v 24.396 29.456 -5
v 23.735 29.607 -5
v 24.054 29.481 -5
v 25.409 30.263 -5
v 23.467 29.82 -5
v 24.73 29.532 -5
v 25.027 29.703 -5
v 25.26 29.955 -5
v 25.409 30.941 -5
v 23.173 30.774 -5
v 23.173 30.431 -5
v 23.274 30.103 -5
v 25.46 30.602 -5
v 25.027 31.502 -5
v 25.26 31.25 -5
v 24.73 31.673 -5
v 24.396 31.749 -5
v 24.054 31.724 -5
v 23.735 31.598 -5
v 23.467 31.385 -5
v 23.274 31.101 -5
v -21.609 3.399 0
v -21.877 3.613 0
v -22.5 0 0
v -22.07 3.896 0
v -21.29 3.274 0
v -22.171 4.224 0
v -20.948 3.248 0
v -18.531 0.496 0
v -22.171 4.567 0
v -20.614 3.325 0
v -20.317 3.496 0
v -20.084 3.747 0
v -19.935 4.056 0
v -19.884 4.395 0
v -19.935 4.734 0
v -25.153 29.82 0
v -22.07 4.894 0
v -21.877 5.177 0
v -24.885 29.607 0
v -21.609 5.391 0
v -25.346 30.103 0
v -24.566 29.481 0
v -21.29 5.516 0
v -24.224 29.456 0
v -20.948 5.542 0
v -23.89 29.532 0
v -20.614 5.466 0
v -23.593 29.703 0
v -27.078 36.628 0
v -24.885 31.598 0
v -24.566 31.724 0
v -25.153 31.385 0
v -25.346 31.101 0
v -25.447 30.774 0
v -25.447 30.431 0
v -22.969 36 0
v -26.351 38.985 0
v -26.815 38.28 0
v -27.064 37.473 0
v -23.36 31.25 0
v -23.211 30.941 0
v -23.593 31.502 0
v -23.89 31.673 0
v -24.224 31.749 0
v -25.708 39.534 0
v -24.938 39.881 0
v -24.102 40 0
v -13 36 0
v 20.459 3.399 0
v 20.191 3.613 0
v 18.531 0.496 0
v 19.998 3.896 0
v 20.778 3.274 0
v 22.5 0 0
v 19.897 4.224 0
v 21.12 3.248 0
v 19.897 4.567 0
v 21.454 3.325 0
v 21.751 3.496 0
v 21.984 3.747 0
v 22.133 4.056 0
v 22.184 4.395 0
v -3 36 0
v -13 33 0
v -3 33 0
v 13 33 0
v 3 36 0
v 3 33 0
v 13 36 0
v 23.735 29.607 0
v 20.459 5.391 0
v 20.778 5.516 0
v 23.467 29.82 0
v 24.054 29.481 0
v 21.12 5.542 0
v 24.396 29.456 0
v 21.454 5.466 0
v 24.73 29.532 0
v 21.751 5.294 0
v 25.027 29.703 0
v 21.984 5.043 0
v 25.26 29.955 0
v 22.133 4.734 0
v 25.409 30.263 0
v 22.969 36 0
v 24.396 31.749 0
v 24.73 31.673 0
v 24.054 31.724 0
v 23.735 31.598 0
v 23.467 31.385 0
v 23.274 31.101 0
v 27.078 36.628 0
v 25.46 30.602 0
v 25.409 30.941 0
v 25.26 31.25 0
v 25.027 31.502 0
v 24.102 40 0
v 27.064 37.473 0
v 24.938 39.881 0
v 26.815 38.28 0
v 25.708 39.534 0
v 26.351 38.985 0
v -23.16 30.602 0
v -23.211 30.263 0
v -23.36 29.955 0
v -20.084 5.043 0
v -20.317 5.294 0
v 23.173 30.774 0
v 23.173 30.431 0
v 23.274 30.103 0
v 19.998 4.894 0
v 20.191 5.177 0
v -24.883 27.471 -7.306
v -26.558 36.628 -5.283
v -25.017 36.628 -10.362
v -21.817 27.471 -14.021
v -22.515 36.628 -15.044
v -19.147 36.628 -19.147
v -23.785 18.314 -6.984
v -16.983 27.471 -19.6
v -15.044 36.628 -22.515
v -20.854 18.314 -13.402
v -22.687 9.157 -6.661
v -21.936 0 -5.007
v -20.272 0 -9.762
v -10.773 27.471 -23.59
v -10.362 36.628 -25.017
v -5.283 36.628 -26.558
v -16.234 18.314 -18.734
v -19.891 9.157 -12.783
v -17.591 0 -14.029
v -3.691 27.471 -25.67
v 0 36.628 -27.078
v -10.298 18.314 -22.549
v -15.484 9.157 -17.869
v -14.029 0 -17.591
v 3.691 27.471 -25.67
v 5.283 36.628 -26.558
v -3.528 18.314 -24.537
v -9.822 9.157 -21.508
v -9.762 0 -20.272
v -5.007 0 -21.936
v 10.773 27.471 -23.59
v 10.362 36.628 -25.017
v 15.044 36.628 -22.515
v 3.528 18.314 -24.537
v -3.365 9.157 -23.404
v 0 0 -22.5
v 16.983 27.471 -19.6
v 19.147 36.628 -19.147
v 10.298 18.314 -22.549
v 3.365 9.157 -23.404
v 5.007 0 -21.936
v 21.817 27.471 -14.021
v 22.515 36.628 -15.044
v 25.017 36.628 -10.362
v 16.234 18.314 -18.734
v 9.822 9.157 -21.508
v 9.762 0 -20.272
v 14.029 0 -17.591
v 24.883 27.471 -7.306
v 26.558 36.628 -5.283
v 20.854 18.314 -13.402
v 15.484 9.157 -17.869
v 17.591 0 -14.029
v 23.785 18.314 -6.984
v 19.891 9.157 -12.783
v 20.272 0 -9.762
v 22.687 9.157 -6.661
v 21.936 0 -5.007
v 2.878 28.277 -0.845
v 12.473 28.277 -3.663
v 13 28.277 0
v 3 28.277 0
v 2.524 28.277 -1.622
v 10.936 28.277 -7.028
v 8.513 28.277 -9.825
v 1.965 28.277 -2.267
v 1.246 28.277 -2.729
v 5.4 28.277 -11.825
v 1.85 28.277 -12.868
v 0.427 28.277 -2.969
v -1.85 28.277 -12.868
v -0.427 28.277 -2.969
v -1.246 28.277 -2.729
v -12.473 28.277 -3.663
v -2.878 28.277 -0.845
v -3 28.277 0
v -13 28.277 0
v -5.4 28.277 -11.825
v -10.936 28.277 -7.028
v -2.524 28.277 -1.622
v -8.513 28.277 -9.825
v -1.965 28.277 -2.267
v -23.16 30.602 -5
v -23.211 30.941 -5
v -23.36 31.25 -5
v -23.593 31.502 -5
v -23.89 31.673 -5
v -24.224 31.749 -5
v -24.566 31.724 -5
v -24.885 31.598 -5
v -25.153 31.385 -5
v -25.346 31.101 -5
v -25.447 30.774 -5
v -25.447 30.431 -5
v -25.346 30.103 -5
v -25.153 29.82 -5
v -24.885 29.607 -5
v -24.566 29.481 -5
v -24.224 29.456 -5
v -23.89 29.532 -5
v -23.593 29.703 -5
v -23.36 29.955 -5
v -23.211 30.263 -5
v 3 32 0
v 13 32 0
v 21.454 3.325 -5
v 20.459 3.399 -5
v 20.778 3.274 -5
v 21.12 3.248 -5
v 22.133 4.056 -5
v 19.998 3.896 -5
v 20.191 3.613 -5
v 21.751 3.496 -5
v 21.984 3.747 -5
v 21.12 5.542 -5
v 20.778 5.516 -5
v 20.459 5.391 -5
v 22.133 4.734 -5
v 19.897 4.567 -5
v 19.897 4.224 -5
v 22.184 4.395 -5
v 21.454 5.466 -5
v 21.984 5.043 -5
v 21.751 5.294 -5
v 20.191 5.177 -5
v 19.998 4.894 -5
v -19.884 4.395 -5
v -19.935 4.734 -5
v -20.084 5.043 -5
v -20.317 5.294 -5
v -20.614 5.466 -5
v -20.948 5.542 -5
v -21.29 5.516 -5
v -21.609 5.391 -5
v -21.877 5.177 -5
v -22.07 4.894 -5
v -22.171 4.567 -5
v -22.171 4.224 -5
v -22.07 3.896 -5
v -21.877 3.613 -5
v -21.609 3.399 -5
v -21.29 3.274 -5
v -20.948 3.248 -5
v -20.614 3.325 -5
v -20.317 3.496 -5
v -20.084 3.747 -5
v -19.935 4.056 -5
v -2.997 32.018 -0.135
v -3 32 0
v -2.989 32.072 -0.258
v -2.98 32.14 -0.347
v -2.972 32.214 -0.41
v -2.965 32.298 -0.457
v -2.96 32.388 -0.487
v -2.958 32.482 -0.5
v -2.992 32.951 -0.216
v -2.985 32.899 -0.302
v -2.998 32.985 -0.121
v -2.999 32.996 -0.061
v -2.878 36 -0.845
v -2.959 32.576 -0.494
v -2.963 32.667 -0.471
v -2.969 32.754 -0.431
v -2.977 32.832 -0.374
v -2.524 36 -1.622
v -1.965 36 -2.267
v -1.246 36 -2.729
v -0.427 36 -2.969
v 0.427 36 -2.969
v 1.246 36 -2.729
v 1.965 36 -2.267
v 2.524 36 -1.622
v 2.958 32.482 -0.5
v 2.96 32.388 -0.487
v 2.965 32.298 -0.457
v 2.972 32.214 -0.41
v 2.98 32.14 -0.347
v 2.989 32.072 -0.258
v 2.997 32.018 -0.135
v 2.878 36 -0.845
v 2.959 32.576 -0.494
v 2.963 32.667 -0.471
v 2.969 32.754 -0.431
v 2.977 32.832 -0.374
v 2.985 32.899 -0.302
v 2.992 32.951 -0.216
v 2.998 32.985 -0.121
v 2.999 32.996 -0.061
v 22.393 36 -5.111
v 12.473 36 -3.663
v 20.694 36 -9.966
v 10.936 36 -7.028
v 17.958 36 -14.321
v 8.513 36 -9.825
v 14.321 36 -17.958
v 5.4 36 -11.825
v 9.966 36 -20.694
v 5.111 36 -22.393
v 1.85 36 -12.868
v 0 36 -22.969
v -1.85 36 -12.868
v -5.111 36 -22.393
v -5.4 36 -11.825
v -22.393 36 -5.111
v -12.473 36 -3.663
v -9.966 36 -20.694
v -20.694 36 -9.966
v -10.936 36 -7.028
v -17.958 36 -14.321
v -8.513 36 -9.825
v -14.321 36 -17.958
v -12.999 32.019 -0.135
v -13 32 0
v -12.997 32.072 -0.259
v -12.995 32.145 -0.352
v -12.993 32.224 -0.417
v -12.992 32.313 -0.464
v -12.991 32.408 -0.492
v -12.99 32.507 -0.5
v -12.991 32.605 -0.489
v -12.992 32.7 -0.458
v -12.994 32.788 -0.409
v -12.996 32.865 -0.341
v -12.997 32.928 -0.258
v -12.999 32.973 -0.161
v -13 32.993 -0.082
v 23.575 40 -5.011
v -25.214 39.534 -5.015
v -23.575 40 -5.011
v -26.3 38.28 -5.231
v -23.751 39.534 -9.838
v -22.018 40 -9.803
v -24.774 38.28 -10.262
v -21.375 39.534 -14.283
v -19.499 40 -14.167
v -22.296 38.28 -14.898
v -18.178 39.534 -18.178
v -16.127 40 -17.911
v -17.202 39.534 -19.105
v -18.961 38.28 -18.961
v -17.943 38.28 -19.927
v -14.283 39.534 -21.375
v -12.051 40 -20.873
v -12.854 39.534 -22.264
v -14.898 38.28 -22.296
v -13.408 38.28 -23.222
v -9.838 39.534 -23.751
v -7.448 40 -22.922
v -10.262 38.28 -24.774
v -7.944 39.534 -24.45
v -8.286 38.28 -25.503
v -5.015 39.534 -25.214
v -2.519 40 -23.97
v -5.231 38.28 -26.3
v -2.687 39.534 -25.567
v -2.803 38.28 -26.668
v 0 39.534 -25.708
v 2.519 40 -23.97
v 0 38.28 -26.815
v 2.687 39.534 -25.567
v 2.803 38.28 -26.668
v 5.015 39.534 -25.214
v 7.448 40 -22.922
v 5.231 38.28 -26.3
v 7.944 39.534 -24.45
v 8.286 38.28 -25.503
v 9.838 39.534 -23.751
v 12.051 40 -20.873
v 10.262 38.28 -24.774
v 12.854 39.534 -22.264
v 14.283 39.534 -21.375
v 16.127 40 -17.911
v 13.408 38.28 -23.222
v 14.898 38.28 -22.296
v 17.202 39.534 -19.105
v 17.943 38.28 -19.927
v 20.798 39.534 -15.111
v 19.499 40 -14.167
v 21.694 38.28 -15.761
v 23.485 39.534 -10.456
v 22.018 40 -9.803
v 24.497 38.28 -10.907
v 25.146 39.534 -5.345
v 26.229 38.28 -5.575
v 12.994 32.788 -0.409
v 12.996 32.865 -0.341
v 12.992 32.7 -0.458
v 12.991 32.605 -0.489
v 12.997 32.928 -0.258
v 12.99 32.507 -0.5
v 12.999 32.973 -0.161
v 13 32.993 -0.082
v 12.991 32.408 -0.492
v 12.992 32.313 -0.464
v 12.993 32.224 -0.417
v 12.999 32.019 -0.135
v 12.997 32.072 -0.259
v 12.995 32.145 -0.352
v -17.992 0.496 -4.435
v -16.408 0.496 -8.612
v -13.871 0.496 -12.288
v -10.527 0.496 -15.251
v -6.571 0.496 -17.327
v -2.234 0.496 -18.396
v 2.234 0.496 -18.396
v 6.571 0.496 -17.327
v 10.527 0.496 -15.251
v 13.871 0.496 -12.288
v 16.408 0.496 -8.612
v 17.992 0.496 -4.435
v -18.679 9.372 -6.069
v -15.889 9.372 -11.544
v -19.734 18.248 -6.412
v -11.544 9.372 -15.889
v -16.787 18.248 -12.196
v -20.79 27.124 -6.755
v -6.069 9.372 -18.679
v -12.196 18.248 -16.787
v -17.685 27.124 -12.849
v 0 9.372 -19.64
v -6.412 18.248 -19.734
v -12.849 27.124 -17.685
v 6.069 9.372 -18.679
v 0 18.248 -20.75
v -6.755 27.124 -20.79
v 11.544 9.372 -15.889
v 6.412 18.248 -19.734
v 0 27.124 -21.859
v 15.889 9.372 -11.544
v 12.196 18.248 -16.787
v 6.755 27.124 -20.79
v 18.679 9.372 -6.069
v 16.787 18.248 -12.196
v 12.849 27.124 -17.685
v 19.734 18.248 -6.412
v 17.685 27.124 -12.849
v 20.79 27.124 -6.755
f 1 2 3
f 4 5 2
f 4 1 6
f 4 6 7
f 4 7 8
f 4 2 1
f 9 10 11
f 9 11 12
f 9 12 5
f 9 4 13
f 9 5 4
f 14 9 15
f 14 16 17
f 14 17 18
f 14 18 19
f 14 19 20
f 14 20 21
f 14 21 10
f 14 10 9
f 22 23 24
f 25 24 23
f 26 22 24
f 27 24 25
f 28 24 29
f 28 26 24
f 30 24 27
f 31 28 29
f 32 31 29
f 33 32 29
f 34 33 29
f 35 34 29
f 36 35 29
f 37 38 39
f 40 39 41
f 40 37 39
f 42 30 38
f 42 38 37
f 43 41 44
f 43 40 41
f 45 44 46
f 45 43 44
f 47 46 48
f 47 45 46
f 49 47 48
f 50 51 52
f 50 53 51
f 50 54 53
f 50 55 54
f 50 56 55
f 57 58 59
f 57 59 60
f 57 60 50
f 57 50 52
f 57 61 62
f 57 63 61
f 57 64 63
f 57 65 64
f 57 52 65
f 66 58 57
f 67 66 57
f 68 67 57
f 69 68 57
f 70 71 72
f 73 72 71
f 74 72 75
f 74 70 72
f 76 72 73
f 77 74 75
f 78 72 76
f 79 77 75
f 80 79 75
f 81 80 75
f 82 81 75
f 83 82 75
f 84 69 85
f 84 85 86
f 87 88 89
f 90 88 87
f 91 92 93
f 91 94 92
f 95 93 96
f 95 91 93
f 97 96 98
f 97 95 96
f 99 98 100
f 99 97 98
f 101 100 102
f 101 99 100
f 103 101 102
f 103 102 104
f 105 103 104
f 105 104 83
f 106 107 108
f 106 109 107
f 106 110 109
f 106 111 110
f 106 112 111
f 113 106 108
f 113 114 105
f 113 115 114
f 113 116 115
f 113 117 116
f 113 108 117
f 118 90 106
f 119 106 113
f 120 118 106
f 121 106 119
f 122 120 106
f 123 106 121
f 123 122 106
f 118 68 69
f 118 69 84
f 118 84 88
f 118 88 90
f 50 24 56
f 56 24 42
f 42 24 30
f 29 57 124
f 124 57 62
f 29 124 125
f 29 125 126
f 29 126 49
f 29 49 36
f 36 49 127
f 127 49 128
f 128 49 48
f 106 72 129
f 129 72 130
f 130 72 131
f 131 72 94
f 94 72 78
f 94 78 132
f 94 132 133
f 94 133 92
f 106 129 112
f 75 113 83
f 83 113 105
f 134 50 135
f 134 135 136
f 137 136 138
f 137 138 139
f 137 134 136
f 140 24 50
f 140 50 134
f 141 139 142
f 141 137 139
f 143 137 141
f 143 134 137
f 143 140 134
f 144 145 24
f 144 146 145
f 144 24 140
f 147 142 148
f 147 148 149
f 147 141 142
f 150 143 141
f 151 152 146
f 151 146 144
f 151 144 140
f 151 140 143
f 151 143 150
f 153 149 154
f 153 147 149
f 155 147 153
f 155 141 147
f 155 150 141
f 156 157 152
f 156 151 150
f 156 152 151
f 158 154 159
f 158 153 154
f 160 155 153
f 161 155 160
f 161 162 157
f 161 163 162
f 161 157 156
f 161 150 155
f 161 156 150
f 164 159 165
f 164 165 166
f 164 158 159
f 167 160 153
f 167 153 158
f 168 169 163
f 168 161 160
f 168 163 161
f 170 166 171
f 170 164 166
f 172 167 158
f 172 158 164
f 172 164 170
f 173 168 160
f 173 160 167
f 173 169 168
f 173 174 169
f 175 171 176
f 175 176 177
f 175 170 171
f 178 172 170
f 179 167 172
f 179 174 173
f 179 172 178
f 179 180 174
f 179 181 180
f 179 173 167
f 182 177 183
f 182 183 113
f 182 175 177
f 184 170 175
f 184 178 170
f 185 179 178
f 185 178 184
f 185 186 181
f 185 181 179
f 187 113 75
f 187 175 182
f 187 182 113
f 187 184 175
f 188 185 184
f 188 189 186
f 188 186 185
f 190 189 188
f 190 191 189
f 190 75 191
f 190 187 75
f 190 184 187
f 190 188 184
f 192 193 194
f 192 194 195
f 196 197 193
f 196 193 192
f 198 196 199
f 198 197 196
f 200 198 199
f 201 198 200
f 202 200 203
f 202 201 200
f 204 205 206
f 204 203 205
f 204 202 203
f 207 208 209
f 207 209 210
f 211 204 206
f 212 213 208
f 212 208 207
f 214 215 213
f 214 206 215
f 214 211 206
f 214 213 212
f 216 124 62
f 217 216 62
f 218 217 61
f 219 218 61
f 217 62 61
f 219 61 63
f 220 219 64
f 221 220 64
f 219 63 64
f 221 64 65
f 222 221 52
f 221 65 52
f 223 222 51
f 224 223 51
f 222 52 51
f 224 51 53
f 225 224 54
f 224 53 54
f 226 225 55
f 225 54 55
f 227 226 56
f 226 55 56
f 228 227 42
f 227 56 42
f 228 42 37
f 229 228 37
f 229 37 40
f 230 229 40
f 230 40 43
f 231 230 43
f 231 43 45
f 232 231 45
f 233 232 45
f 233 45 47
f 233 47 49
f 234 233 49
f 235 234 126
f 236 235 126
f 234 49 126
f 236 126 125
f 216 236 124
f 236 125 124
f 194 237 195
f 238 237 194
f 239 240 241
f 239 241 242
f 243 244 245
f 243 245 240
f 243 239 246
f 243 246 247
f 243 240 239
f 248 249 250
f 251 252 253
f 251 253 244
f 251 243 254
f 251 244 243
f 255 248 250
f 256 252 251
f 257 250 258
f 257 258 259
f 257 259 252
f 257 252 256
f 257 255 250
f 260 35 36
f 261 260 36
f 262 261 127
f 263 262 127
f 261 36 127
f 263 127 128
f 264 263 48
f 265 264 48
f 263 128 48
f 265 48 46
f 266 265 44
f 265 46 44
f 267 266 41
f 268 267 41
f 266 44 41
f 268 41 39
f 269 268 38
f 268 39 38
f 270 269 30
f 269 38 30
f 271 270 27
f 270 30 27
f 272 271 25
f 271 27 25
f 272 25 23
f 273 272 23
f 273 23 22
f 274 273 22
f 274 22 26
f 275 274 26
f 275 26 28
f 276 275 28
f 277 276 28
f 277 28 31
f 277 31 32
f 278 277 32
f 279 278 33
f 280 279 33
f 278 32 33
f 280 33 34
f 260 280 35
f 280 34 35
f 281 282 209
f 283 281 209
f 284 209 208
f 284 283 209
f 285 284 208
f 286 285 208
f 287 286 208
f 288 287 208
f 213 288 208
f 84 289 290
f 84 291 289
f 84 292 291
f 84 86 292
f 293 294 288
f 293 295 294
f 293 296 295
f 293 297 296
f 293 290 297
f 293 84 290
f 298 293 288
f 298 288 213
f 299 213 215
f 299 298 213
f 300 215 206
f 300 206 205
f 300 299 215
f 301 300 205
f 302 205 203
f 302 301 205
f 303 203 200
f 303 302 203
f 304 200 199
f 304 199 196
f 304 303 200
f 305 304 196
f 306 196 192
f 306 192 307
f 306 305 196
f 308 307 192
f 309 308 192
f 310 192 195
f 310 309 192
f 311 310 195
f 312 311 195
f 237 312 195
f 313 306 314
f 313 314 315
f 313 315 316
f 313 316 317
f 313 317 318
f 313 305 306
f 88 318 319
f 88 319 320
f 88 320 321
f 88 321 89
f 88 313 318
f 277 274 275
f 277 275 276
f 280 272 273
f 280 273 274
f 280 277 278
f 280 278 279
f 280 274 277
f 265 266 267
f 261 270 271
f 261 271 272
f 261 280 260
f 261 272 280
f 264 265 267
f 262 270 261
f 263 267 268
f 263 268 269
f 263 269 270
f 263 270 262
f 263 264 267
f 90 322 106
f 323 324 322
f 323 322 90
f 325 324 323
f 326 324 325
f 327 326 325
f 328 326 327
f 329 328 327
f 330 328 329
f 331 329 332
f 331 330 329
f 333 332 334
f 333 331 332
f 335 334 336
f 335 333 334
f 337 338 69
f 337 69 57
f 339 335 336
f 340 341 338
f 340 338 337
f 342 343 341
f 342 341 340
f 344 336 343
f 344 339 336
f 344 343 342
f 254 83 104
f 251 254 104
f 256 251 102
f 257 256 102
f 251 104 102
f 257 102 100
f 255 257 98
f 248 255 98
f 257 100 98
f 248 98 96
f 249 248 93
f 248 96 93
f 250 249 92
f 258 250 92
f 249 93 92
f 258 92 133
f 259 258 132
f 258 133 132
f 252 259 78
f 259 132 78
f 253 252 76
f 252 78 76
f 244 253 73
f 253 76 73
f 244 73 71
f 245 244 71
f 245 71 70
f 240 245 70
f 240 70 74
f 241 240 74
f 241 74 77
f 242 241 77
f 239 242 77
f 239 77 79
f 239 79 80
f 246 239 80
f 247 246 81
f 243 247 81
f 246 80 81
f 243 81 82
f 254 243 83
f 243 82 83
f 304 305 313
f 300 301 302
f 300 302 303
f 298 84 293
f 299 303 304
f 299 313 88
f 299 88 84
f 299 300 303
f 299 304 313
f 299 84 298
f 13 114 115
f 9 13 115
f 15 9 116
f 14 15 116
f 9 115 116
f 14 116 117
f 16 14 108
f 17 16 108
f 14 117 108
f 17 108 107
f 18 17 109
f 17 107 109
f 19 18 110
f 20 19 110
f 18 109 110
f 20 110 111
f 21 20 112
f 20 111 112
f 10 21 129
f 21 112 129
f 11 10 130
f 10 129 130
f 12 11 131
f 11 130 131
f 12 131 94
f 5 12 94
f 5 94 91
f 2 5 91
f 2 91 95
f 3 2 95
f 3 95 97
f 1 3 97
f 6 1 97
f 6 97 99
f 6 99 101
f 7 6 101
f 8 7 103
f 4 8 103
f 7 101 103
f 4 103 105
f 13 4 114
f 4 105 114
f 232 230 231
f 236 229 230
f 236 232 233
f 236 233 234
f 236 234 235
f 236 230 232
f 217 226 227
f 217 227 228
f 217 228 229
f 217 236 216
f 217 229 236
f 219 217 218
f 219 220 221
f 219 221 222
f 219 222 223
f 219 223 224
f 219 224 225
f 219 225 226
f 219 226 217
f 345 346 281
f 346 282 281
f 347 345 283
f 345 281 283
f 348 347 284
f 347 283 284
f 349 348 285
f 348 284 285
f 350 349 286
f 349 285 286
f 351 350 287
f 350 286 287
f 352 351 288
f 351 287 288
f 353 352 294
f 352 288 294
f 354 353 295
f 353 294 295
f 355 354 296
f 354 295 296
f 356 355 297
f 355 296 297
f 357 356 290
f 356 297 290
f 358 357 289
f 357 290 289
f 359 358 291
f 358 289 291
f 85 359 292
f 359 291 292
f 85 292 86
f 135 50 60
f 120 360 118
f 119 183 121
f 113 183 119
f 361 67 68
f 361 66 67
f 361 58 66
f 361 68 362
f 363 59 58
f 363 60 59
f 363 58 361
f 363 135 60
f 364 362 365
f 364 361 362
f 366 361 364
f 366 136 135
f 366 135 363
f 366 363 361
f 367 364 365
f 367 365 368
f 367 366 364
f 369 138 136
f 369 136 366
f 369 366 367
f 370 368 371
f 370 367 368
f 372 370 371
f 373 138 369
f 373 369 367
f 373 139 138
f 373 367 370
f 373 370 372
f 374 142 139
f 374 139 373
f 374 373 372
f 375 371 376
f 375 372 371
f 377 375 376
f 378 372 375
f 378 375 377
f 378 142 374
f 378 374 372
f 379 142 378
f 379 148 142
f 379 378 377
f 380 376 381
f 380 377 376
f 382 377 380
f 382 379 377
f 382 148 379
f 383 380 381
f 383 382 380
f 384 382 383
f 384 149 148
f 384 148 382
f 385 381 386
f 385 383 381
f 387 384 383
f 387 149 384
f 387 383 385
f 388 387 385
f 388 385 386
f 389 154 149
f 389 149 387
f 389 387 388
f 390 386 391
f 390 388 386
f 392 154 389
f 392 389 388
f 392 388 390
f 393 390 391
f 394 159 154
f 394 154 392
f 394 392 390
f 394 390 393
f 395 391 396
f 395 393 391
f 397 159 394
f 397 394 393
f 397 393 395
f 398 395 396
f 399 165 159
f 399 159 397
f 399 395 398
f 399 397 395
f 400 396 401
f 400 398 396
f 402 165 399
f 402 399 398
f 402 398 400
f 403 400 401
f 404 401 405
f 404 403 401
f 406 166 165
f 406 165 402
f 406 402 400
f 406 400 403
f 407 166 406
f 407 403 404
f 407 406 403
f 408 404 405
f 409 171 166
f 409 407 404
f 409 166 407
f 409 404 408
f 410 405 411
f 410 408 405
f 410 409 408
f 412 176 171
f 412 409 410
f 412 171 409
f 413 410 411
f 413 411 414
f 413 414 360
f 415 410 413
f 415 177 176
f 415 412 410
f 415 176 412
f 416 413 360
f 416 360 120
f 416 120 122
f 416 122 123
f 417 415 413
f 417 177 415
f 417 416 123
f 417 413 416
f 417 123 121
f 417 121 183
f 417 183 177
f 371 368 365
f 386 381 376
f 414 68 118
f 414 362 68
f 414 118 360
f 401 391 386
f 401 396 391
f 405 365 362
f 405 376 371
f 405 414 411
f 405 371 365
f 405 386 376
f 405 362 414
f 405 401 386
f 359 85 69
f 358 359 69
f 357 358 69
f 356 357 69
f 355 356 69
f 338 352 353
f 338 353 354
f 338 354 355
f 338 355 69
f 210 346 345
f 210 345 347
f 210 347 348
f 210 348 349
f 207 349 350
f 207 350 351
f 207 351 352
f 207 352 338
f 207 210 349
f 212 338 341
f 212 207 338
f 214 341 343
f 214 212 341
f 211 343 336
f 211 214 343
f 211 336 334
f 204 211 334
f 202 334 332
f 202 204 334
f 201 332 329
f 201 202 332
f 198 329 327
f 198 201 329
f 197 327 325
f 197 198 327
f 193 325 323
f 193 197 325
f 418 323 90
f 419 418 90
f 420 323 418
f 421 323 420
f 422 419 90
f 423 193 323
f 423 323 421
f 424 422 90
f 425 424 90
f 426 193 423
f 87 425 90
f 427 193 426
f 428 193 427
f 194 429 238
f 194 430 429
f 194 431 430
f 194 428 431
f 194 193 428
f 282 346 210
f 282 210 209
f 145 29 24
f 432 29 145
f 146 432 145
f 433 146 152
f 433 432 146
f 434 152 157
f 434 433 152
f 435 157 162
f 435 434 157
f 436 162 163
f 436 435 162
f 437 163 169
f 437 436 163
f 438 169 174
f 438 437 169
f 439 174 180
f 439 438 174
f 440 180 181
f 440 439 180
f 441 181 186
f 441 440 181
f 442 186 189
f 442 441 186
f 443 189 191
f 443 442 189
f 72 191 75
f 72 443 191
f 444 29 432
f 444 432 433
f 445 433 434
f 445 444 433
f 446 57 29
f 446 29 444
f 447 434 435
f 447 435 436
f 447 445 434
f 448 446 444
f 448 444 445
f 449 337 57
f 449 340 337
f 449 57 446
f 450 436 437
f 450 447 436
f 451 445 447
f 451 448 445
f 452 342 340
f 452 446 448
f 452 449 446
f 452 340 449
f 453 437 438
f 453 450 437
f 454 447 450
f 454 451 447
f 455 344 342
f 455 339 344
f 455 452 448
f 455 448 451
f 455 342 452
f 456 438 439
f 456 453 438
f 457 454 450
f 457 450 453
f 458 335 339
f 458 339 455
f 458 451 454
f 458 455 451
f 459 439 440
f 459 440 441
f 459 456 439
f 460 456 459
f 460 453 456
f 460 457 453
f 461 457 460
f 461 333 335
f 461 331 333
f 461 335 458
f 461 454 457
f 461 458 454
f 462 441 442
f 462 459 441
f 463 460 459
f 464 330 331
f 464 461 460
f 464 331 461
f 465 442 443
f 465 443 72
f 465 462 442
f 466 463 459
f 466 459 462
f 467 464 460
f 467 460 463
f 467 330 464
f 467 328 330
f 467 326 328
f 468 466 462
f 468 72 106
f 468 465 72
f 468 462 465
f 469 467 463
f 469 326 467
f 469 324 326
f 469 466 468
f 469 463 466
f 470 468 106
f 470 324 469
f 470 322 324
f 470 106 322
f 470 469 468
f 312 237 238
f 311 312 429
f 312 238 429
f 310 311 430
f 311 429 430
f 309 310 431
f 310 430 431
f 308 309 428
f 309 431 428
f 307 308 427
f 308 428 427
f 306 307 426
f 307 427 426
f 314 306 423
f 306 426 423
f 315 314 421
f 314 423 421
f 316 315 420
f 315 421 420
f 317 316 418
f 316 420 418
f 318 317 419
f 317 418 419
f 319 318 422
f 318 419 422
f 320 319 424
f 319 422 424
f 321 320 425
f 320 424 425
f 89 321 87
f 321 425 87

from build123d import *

# Parameters (mm, degrees)
REVOLVE1_ANGLE     = 180
FILLET1_R          = 3
SKETCH2_W          = 30
SKETCH2_H          = 0.5
SKETCH3_R          = 1.15
CUT_EXTRUDE1_DEPTH = 5


with BuildPart() as part:
    # Sketch1 → Revolve1 (revolve)
    with BuildSketch(Plane.XY):
        Polygon((0, 40), (-27.5, 40), (-22.5, 0), (-18.530888493, 0.496138938), (-22.968871126, 36), (-13, 36), (-13, 28.277027027), (-3, 28.277027027), (-3, 36), (0, 36), align=None)
    revolve(axis=Axis((0, 40, 0), (0, -1, 0)), revolution_arc=REVOLVE1_ANGLE)

    # Fillet1
    fillet1_edges = [part.edges().sort_by_distance(p)[0] for p in [
        (0, 40, -27.5),
    ]]
    fillet(fillet1_edges, radius=FILLET1_R)

    # Sketch2 → Cut-Revolve1 (revolve, cut)
    with BuildSketch(Plane.XY):
        with Locations((1, 32.75)):
            Rectangle(SKETCH2_W, SKETCH2_H)
    revolve(axis=Axis((-14, 32.5, 0), (1, 0, 0)), mode=Mode.SUBTRACT)

    # Sketch3 → Cut-Extrude1 (cut)
    with BuildSketch(Plane.XY):
        with Locations((-24.309743639, 30.602464611)):
            Circle(SKETCH3_R)
        with Locations((-21.033834323, 4.395190082)):
            Circle(SKETCH3_R)
        with Locations((21.033834323, 4.395190082)):
            Circle(SKETCH3_R)
        with Locations((24.309743639, 30.602464611)):
            Circle(SKETCH3_R)
    extrude(amount=-CUT_EXTRUDE1_DEPTH, mode=Mode.SUBTRACT)


solid = part.part
